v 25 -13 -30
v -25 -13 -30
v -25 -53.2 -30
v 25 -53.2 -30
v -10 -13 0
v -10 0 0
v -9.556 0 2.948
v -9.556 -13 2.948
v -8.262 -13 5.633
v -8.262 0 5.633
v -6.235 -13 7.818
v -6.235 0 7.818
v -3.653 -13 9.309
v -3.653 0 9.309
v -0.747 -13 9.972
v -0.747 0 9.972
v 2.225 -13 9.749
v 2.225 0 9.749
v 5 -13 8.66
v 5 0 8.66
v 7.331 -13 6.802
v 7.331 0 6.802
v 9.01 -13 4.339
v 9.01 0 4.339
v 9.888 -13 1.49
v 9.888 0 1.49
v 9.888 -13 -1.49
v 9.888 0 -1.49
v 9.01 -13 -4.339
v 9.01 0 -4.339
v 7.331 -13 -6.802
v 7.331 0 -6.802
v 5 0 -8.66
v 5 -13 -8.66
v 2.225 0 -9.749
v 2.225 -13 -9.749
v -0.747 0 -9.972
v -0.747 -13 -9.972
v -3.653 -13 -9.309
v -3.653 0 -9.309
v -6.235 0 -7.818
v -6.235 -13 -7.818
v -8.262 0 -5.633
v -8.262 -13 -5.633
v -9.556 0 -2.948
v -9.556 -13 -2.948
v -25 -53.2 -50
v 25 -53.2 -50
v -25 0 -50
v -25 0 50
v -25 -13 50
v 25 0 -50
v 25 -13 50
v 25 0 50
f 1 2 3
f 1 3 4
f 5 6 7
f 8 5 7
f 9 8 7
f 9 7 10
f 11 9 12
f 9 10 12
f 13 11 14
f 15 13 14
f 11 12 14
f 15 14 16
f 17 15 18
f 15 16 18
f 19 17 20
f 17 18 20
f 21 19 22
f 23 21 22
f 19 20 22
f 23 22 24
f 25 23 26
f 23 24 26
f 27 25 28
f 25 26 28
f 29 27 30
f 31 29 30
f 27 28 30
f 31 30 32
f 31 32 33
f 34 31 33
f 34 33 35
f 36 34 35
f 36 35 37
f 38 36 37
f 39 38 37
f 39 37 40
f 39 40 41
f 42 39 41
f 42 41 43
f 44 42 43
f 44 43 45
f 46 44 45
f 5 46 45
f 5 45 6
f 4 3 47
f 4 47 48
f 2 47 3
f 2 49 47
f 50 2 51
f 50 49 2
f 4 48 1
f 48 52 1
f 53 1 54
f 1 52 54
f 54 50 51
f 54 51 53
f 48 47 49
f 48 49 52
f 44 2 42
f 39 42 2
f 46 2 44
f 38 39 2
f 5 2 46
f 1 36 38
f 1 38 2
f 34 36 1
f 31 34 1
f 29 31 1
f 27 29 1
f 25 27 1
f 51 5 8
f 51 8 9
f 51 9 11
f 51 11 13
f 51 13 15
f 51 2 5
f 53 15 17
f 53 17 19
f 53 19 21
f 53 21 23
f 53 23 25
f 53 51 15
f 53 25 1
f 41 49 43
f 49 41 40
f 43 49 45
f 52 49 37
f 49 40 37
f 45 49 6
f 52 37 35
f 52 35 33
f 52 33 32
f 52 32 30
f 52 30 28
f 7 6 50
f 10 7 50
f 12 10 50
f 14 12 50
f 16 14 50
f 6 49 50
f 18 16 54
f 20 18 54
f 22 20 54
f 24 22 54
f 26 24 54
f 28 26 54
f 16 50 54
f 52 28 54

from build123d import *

# Parameters (mm, degrees)
F0_W     = 50
F0_H     = 100
F1_DEPTH = 13
F2_W     = 50
F2_H     = 20
F3_DEPTH = 40.2
F4_R     = 10
F5_DEPTH = 66.4


# Not quite as in the source:
# - a feature names something its author has since deleted; it is built from what else it names


with BuildPart() as f1:
    # F0 (on Front) → F1 (new body)
    with BuildSketch(Plane.XZ):
        Rectangle(F0_W, F0_H)
    extrude(amount=F1_DEPTH)

    # F2 (on face) → F3 (join)
    with BuildSketch(Plane.XZ.offset(13)):
        with Locations((0, -40)):
            Rectangle(F2_W, F2_H)
    extrude(amount=F3_DEPTH)

    # F4 (on face) → F5 (cut)
    with BuildSketch(Plane(origin=(0, 0, 0), x_dir=(-1, 0, 0), z_dir=(0, 1, 0))):
        Circle(F4_R)
    extrude(amount=-F5_DEPTH, mode=Mode.SUBTRACT)


solid = f1.part
